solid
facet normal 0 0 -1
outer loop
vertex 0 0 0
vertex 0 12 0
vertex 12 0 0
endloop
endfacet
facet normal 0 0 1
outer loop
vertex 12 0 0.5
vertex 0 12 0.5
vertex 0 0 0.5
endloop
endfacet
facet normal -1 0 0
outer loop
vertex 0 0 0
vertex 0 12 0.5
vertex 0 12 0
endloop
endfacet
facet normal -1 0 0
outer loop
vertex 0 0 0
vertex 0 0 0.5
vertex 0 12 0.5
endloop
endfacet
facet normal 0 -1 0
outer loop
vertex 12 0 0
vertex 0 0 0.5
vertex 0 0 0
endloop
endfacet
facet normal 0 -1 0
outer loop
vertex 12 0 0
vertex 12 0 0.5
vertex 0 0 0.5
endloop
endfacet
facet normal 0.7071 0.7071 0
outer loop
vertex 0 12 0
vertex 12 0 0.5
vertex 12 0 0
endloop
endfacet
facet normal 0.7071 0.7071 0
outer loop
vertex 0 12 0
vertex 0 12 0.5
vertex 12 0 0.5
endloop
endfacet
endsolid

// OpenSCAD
module triangle()
{
    color( [1, 1, 1, 1]) //white HDPE
       {
            linear_extrude(height=1/2) 
            {
                polygon(points=[[0,0],[12,0],[0,12]], paths=[[0,1,2]]);
            }
        }
}
triangle();
